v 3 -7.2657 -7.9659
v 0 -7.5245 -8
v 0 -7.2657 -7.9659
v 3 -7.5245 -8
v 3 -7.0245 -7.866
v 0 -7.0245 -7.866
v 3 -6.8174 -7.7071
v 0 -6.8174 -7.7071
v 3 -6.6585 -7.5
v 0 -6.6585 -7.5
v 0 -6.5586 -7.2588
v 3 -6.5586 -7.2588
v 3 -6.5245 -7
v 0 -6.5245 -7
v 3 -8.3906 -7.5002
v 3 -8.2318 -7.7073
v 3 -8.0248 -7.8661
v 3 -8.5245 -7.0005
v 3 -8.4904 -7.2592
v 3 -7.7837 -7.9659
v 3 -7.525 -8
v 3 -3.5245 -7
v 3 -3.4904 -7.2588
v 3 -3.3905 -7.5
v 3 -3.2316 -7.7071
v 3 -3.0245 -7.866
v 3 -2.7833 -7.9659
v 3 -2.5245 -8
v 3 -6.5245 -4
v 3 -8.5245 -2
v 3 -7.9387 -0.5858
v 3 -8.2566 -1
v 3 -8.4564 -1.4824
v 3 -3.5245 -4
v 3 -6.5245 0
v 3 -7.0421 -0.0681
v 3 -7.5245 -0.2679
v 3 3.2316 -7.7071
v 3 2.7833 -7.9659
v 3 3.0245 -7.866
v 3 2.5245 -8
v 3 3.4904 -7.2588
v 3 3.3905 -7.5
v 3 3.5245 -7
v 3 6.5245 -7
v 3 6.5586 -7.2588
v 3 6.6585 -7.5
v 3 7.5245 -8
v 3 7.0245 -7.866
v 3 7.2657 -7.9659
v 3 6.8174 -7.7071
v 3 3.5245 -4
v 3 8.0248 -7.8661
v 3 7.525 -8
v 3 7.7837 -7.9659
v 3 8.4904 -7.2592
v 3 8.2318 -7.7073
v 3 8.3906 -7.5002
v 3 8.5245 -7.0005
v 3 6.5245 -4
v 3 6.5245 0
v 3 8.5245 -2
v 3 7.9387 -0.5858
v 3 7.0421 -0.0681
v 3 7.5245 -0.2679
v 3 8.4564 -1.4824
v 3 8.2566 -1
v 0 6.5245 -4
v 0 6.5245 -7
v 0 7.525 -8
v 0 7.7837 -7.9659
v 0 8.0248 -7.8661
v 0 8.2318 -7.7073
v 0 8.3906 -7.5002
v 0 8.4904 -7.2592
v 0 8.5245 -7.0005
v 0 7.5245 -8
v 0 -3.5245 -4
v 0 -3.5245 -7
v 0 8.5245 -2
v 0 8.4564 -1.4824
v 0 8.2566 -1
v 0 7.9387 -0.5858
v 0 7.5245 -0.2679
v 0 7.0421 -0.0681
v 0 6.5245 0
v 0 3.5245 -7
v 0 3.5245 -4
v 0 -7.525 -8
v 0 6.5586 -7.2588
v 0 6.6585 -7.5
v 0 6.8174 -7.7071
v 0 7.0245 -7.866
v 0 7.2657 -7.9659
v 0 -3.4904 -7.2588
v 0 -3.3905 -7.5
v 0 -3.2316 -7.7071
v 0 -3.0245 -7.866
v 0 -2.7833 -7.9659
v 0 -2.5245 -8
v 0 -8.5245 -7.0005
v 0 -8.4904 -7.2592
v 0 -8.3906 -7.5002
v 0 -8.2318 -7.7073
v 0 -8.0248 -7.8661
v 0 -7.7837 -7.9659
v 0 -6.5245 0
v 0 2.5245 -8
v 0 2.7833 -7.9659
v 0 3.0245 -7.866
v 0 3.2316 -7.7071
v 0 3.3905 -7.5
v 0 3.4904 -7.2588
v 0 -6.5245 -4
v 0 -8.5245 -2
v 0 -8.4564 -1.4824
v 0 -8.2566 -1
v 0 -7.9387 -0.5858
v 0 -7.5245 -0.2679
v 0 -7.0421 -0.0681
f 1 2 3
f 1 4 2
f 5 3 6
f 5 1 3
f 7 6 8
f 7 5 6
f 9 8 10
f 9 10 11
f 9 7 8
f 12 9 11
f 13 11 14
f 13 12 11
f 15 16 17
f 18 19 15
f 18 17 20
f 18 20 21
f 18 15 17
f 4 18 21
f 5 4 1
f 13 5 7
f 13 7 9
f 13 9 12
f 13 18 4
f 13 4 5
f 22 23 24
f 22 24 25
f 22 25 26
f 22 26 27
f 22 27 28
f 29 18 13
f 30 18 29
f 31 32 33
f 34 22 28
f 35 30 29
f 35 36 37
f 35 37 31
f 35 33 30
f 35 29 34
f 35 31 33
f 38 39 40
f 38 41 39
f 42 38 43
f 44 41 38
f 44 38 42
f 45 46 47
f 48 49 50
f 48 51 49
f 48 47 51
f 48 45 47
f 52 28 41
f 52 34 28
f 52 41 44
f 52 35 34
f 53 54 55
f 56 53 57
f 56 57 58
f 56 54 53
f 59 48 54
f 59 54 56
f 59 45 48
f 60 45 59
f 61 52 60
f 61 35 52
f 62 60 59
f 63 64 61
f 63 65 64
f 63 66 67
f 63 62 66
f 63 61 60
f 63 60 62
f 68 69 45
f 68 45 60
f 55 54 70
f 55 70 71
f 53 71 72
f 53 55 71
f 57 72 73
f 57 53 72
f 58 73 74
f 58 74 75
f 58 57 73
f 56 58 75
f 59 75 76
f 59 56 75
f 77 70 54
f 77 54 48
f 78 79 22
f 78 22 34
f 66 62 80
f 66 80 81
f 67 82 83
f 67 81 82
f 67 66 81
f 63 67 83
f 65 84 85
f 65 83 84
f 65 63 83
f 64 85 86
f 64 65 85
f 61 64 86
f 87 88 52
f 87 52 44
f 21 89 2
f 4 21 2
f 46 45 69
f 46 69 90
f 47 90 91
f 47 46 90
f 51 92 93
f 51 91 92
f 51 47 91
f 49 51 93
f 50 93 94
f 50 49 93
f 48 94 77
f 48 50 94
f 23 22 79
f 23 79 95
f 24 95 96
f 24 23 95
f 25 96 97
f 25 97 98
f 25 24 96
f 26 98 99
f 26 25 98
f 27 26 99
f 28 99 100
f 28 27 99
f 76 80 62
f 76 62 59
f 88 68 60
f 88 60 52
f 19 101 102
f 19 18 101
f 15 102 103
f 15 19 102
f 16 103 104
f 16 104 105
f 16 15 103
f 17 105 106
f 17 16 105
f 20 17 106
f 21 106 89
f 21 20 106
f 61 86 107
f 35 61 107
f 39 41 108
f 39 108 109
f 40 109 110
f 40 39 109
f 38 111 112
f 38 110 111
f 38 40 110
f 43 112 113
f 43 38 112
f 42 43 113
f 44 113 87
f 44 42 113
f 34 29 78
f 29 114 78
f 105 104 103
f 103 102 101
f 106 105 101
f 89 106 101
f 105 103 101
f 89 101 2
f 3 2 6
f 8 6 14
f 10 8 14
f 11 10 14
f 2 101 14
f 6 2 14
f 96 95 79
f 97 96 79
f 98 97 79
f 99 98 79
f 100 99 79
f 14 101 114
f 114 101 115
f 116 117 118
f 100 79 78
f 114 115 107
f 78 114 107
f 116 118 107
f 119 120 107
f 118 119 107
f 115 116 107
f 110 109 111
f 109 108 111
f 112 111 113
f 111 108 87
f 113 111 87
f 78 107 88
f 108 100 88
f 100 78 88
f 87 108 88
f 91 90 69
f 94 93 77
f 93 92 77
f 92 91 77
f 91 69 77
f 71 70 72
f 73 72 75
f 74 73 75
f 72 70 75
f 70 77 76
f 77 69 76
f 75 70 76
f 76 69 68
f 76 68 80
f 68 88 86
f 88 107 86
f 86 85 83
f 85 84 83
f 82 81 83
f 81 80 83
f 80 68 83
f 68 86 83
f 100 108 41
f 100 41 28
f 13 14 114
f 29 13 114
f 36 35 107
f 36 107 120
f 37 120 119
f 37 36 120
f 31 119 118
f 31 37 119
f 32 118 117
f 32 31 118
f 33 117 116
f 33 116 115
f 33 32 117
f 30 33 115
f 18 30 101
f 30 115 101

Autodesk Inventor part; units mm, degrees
ref_plane "YZ Plane" through (0, 0, 0) normal (1, 0, 0) x (0, 1, 0)
ref_plane "XZ Plane" through (0, 0, 0) normal (0, 1, 0) x (-1, 0, 0)
ref_plane "XY Plane" through (0, 0, 0) normal (0, 0, 1) x (1, 0, 0)
sketch "草圖1" plane through (0, 0, 0) normal (1, 0, 0) x (0, 1, 0)
  line L0 (-8.5245, 0) -> (-8.5245, -8)
  line L1 (-8.5245, -8) -> (-6.5245, -8)
  line L2 (-6.5245, -8) -> (-6.5245, -4)
  line L3 (-6.5245, -4) -> (-3.5245, -4)
  line L4 (3.5245, -4) -> (3.5245, -8)
  line L5 (3.5245, -8) -> (-3.5245, -8)
  line L6 (8.5245, 0) -> (8.5245, -8)
  line L7 (8.5245, -8) -> (6.5245, -8)
  line L8 (6.5245, -8) -> (6.5245, -4)
  line L9 (6.5245, -4) -> (3.5245, -4)
  line L10 (8.5245, 0) -> (-8.5245, 0)
  line L11 (-3.5245, -8) -> (-3.5245, -4)
  point P0 (0, 0)
  point P1 (0, 0)
  point P2 (0, 0)
  dimension "d2" = 3
  dimension "d3" = 7.049
  dimension "d4" = 8
  dimension "d5" = 4
  dimension "d6" = 2
  dimension "d12" = 17.049
extrude "擠出1" add sketch "草圖1" along normal blind 3
fillet "圓角1" radius 2 2 edges at (1.5, 8.5245, 0) (1.5, -8.5245, 0)
fillet "圓角2" radius 1 4 edges at (1.5, 6.5245, -8) (1.5, 3.5245, -8) (1.5, -3.5245, -8) (1.5, -6.5245, -8)
fillet "圓角3" radius 1 2 edges at (1.5, 8.5245, -8) (1.5, -8.5245, -8)
properties part number "flange support" material "木材 (楓木)"
